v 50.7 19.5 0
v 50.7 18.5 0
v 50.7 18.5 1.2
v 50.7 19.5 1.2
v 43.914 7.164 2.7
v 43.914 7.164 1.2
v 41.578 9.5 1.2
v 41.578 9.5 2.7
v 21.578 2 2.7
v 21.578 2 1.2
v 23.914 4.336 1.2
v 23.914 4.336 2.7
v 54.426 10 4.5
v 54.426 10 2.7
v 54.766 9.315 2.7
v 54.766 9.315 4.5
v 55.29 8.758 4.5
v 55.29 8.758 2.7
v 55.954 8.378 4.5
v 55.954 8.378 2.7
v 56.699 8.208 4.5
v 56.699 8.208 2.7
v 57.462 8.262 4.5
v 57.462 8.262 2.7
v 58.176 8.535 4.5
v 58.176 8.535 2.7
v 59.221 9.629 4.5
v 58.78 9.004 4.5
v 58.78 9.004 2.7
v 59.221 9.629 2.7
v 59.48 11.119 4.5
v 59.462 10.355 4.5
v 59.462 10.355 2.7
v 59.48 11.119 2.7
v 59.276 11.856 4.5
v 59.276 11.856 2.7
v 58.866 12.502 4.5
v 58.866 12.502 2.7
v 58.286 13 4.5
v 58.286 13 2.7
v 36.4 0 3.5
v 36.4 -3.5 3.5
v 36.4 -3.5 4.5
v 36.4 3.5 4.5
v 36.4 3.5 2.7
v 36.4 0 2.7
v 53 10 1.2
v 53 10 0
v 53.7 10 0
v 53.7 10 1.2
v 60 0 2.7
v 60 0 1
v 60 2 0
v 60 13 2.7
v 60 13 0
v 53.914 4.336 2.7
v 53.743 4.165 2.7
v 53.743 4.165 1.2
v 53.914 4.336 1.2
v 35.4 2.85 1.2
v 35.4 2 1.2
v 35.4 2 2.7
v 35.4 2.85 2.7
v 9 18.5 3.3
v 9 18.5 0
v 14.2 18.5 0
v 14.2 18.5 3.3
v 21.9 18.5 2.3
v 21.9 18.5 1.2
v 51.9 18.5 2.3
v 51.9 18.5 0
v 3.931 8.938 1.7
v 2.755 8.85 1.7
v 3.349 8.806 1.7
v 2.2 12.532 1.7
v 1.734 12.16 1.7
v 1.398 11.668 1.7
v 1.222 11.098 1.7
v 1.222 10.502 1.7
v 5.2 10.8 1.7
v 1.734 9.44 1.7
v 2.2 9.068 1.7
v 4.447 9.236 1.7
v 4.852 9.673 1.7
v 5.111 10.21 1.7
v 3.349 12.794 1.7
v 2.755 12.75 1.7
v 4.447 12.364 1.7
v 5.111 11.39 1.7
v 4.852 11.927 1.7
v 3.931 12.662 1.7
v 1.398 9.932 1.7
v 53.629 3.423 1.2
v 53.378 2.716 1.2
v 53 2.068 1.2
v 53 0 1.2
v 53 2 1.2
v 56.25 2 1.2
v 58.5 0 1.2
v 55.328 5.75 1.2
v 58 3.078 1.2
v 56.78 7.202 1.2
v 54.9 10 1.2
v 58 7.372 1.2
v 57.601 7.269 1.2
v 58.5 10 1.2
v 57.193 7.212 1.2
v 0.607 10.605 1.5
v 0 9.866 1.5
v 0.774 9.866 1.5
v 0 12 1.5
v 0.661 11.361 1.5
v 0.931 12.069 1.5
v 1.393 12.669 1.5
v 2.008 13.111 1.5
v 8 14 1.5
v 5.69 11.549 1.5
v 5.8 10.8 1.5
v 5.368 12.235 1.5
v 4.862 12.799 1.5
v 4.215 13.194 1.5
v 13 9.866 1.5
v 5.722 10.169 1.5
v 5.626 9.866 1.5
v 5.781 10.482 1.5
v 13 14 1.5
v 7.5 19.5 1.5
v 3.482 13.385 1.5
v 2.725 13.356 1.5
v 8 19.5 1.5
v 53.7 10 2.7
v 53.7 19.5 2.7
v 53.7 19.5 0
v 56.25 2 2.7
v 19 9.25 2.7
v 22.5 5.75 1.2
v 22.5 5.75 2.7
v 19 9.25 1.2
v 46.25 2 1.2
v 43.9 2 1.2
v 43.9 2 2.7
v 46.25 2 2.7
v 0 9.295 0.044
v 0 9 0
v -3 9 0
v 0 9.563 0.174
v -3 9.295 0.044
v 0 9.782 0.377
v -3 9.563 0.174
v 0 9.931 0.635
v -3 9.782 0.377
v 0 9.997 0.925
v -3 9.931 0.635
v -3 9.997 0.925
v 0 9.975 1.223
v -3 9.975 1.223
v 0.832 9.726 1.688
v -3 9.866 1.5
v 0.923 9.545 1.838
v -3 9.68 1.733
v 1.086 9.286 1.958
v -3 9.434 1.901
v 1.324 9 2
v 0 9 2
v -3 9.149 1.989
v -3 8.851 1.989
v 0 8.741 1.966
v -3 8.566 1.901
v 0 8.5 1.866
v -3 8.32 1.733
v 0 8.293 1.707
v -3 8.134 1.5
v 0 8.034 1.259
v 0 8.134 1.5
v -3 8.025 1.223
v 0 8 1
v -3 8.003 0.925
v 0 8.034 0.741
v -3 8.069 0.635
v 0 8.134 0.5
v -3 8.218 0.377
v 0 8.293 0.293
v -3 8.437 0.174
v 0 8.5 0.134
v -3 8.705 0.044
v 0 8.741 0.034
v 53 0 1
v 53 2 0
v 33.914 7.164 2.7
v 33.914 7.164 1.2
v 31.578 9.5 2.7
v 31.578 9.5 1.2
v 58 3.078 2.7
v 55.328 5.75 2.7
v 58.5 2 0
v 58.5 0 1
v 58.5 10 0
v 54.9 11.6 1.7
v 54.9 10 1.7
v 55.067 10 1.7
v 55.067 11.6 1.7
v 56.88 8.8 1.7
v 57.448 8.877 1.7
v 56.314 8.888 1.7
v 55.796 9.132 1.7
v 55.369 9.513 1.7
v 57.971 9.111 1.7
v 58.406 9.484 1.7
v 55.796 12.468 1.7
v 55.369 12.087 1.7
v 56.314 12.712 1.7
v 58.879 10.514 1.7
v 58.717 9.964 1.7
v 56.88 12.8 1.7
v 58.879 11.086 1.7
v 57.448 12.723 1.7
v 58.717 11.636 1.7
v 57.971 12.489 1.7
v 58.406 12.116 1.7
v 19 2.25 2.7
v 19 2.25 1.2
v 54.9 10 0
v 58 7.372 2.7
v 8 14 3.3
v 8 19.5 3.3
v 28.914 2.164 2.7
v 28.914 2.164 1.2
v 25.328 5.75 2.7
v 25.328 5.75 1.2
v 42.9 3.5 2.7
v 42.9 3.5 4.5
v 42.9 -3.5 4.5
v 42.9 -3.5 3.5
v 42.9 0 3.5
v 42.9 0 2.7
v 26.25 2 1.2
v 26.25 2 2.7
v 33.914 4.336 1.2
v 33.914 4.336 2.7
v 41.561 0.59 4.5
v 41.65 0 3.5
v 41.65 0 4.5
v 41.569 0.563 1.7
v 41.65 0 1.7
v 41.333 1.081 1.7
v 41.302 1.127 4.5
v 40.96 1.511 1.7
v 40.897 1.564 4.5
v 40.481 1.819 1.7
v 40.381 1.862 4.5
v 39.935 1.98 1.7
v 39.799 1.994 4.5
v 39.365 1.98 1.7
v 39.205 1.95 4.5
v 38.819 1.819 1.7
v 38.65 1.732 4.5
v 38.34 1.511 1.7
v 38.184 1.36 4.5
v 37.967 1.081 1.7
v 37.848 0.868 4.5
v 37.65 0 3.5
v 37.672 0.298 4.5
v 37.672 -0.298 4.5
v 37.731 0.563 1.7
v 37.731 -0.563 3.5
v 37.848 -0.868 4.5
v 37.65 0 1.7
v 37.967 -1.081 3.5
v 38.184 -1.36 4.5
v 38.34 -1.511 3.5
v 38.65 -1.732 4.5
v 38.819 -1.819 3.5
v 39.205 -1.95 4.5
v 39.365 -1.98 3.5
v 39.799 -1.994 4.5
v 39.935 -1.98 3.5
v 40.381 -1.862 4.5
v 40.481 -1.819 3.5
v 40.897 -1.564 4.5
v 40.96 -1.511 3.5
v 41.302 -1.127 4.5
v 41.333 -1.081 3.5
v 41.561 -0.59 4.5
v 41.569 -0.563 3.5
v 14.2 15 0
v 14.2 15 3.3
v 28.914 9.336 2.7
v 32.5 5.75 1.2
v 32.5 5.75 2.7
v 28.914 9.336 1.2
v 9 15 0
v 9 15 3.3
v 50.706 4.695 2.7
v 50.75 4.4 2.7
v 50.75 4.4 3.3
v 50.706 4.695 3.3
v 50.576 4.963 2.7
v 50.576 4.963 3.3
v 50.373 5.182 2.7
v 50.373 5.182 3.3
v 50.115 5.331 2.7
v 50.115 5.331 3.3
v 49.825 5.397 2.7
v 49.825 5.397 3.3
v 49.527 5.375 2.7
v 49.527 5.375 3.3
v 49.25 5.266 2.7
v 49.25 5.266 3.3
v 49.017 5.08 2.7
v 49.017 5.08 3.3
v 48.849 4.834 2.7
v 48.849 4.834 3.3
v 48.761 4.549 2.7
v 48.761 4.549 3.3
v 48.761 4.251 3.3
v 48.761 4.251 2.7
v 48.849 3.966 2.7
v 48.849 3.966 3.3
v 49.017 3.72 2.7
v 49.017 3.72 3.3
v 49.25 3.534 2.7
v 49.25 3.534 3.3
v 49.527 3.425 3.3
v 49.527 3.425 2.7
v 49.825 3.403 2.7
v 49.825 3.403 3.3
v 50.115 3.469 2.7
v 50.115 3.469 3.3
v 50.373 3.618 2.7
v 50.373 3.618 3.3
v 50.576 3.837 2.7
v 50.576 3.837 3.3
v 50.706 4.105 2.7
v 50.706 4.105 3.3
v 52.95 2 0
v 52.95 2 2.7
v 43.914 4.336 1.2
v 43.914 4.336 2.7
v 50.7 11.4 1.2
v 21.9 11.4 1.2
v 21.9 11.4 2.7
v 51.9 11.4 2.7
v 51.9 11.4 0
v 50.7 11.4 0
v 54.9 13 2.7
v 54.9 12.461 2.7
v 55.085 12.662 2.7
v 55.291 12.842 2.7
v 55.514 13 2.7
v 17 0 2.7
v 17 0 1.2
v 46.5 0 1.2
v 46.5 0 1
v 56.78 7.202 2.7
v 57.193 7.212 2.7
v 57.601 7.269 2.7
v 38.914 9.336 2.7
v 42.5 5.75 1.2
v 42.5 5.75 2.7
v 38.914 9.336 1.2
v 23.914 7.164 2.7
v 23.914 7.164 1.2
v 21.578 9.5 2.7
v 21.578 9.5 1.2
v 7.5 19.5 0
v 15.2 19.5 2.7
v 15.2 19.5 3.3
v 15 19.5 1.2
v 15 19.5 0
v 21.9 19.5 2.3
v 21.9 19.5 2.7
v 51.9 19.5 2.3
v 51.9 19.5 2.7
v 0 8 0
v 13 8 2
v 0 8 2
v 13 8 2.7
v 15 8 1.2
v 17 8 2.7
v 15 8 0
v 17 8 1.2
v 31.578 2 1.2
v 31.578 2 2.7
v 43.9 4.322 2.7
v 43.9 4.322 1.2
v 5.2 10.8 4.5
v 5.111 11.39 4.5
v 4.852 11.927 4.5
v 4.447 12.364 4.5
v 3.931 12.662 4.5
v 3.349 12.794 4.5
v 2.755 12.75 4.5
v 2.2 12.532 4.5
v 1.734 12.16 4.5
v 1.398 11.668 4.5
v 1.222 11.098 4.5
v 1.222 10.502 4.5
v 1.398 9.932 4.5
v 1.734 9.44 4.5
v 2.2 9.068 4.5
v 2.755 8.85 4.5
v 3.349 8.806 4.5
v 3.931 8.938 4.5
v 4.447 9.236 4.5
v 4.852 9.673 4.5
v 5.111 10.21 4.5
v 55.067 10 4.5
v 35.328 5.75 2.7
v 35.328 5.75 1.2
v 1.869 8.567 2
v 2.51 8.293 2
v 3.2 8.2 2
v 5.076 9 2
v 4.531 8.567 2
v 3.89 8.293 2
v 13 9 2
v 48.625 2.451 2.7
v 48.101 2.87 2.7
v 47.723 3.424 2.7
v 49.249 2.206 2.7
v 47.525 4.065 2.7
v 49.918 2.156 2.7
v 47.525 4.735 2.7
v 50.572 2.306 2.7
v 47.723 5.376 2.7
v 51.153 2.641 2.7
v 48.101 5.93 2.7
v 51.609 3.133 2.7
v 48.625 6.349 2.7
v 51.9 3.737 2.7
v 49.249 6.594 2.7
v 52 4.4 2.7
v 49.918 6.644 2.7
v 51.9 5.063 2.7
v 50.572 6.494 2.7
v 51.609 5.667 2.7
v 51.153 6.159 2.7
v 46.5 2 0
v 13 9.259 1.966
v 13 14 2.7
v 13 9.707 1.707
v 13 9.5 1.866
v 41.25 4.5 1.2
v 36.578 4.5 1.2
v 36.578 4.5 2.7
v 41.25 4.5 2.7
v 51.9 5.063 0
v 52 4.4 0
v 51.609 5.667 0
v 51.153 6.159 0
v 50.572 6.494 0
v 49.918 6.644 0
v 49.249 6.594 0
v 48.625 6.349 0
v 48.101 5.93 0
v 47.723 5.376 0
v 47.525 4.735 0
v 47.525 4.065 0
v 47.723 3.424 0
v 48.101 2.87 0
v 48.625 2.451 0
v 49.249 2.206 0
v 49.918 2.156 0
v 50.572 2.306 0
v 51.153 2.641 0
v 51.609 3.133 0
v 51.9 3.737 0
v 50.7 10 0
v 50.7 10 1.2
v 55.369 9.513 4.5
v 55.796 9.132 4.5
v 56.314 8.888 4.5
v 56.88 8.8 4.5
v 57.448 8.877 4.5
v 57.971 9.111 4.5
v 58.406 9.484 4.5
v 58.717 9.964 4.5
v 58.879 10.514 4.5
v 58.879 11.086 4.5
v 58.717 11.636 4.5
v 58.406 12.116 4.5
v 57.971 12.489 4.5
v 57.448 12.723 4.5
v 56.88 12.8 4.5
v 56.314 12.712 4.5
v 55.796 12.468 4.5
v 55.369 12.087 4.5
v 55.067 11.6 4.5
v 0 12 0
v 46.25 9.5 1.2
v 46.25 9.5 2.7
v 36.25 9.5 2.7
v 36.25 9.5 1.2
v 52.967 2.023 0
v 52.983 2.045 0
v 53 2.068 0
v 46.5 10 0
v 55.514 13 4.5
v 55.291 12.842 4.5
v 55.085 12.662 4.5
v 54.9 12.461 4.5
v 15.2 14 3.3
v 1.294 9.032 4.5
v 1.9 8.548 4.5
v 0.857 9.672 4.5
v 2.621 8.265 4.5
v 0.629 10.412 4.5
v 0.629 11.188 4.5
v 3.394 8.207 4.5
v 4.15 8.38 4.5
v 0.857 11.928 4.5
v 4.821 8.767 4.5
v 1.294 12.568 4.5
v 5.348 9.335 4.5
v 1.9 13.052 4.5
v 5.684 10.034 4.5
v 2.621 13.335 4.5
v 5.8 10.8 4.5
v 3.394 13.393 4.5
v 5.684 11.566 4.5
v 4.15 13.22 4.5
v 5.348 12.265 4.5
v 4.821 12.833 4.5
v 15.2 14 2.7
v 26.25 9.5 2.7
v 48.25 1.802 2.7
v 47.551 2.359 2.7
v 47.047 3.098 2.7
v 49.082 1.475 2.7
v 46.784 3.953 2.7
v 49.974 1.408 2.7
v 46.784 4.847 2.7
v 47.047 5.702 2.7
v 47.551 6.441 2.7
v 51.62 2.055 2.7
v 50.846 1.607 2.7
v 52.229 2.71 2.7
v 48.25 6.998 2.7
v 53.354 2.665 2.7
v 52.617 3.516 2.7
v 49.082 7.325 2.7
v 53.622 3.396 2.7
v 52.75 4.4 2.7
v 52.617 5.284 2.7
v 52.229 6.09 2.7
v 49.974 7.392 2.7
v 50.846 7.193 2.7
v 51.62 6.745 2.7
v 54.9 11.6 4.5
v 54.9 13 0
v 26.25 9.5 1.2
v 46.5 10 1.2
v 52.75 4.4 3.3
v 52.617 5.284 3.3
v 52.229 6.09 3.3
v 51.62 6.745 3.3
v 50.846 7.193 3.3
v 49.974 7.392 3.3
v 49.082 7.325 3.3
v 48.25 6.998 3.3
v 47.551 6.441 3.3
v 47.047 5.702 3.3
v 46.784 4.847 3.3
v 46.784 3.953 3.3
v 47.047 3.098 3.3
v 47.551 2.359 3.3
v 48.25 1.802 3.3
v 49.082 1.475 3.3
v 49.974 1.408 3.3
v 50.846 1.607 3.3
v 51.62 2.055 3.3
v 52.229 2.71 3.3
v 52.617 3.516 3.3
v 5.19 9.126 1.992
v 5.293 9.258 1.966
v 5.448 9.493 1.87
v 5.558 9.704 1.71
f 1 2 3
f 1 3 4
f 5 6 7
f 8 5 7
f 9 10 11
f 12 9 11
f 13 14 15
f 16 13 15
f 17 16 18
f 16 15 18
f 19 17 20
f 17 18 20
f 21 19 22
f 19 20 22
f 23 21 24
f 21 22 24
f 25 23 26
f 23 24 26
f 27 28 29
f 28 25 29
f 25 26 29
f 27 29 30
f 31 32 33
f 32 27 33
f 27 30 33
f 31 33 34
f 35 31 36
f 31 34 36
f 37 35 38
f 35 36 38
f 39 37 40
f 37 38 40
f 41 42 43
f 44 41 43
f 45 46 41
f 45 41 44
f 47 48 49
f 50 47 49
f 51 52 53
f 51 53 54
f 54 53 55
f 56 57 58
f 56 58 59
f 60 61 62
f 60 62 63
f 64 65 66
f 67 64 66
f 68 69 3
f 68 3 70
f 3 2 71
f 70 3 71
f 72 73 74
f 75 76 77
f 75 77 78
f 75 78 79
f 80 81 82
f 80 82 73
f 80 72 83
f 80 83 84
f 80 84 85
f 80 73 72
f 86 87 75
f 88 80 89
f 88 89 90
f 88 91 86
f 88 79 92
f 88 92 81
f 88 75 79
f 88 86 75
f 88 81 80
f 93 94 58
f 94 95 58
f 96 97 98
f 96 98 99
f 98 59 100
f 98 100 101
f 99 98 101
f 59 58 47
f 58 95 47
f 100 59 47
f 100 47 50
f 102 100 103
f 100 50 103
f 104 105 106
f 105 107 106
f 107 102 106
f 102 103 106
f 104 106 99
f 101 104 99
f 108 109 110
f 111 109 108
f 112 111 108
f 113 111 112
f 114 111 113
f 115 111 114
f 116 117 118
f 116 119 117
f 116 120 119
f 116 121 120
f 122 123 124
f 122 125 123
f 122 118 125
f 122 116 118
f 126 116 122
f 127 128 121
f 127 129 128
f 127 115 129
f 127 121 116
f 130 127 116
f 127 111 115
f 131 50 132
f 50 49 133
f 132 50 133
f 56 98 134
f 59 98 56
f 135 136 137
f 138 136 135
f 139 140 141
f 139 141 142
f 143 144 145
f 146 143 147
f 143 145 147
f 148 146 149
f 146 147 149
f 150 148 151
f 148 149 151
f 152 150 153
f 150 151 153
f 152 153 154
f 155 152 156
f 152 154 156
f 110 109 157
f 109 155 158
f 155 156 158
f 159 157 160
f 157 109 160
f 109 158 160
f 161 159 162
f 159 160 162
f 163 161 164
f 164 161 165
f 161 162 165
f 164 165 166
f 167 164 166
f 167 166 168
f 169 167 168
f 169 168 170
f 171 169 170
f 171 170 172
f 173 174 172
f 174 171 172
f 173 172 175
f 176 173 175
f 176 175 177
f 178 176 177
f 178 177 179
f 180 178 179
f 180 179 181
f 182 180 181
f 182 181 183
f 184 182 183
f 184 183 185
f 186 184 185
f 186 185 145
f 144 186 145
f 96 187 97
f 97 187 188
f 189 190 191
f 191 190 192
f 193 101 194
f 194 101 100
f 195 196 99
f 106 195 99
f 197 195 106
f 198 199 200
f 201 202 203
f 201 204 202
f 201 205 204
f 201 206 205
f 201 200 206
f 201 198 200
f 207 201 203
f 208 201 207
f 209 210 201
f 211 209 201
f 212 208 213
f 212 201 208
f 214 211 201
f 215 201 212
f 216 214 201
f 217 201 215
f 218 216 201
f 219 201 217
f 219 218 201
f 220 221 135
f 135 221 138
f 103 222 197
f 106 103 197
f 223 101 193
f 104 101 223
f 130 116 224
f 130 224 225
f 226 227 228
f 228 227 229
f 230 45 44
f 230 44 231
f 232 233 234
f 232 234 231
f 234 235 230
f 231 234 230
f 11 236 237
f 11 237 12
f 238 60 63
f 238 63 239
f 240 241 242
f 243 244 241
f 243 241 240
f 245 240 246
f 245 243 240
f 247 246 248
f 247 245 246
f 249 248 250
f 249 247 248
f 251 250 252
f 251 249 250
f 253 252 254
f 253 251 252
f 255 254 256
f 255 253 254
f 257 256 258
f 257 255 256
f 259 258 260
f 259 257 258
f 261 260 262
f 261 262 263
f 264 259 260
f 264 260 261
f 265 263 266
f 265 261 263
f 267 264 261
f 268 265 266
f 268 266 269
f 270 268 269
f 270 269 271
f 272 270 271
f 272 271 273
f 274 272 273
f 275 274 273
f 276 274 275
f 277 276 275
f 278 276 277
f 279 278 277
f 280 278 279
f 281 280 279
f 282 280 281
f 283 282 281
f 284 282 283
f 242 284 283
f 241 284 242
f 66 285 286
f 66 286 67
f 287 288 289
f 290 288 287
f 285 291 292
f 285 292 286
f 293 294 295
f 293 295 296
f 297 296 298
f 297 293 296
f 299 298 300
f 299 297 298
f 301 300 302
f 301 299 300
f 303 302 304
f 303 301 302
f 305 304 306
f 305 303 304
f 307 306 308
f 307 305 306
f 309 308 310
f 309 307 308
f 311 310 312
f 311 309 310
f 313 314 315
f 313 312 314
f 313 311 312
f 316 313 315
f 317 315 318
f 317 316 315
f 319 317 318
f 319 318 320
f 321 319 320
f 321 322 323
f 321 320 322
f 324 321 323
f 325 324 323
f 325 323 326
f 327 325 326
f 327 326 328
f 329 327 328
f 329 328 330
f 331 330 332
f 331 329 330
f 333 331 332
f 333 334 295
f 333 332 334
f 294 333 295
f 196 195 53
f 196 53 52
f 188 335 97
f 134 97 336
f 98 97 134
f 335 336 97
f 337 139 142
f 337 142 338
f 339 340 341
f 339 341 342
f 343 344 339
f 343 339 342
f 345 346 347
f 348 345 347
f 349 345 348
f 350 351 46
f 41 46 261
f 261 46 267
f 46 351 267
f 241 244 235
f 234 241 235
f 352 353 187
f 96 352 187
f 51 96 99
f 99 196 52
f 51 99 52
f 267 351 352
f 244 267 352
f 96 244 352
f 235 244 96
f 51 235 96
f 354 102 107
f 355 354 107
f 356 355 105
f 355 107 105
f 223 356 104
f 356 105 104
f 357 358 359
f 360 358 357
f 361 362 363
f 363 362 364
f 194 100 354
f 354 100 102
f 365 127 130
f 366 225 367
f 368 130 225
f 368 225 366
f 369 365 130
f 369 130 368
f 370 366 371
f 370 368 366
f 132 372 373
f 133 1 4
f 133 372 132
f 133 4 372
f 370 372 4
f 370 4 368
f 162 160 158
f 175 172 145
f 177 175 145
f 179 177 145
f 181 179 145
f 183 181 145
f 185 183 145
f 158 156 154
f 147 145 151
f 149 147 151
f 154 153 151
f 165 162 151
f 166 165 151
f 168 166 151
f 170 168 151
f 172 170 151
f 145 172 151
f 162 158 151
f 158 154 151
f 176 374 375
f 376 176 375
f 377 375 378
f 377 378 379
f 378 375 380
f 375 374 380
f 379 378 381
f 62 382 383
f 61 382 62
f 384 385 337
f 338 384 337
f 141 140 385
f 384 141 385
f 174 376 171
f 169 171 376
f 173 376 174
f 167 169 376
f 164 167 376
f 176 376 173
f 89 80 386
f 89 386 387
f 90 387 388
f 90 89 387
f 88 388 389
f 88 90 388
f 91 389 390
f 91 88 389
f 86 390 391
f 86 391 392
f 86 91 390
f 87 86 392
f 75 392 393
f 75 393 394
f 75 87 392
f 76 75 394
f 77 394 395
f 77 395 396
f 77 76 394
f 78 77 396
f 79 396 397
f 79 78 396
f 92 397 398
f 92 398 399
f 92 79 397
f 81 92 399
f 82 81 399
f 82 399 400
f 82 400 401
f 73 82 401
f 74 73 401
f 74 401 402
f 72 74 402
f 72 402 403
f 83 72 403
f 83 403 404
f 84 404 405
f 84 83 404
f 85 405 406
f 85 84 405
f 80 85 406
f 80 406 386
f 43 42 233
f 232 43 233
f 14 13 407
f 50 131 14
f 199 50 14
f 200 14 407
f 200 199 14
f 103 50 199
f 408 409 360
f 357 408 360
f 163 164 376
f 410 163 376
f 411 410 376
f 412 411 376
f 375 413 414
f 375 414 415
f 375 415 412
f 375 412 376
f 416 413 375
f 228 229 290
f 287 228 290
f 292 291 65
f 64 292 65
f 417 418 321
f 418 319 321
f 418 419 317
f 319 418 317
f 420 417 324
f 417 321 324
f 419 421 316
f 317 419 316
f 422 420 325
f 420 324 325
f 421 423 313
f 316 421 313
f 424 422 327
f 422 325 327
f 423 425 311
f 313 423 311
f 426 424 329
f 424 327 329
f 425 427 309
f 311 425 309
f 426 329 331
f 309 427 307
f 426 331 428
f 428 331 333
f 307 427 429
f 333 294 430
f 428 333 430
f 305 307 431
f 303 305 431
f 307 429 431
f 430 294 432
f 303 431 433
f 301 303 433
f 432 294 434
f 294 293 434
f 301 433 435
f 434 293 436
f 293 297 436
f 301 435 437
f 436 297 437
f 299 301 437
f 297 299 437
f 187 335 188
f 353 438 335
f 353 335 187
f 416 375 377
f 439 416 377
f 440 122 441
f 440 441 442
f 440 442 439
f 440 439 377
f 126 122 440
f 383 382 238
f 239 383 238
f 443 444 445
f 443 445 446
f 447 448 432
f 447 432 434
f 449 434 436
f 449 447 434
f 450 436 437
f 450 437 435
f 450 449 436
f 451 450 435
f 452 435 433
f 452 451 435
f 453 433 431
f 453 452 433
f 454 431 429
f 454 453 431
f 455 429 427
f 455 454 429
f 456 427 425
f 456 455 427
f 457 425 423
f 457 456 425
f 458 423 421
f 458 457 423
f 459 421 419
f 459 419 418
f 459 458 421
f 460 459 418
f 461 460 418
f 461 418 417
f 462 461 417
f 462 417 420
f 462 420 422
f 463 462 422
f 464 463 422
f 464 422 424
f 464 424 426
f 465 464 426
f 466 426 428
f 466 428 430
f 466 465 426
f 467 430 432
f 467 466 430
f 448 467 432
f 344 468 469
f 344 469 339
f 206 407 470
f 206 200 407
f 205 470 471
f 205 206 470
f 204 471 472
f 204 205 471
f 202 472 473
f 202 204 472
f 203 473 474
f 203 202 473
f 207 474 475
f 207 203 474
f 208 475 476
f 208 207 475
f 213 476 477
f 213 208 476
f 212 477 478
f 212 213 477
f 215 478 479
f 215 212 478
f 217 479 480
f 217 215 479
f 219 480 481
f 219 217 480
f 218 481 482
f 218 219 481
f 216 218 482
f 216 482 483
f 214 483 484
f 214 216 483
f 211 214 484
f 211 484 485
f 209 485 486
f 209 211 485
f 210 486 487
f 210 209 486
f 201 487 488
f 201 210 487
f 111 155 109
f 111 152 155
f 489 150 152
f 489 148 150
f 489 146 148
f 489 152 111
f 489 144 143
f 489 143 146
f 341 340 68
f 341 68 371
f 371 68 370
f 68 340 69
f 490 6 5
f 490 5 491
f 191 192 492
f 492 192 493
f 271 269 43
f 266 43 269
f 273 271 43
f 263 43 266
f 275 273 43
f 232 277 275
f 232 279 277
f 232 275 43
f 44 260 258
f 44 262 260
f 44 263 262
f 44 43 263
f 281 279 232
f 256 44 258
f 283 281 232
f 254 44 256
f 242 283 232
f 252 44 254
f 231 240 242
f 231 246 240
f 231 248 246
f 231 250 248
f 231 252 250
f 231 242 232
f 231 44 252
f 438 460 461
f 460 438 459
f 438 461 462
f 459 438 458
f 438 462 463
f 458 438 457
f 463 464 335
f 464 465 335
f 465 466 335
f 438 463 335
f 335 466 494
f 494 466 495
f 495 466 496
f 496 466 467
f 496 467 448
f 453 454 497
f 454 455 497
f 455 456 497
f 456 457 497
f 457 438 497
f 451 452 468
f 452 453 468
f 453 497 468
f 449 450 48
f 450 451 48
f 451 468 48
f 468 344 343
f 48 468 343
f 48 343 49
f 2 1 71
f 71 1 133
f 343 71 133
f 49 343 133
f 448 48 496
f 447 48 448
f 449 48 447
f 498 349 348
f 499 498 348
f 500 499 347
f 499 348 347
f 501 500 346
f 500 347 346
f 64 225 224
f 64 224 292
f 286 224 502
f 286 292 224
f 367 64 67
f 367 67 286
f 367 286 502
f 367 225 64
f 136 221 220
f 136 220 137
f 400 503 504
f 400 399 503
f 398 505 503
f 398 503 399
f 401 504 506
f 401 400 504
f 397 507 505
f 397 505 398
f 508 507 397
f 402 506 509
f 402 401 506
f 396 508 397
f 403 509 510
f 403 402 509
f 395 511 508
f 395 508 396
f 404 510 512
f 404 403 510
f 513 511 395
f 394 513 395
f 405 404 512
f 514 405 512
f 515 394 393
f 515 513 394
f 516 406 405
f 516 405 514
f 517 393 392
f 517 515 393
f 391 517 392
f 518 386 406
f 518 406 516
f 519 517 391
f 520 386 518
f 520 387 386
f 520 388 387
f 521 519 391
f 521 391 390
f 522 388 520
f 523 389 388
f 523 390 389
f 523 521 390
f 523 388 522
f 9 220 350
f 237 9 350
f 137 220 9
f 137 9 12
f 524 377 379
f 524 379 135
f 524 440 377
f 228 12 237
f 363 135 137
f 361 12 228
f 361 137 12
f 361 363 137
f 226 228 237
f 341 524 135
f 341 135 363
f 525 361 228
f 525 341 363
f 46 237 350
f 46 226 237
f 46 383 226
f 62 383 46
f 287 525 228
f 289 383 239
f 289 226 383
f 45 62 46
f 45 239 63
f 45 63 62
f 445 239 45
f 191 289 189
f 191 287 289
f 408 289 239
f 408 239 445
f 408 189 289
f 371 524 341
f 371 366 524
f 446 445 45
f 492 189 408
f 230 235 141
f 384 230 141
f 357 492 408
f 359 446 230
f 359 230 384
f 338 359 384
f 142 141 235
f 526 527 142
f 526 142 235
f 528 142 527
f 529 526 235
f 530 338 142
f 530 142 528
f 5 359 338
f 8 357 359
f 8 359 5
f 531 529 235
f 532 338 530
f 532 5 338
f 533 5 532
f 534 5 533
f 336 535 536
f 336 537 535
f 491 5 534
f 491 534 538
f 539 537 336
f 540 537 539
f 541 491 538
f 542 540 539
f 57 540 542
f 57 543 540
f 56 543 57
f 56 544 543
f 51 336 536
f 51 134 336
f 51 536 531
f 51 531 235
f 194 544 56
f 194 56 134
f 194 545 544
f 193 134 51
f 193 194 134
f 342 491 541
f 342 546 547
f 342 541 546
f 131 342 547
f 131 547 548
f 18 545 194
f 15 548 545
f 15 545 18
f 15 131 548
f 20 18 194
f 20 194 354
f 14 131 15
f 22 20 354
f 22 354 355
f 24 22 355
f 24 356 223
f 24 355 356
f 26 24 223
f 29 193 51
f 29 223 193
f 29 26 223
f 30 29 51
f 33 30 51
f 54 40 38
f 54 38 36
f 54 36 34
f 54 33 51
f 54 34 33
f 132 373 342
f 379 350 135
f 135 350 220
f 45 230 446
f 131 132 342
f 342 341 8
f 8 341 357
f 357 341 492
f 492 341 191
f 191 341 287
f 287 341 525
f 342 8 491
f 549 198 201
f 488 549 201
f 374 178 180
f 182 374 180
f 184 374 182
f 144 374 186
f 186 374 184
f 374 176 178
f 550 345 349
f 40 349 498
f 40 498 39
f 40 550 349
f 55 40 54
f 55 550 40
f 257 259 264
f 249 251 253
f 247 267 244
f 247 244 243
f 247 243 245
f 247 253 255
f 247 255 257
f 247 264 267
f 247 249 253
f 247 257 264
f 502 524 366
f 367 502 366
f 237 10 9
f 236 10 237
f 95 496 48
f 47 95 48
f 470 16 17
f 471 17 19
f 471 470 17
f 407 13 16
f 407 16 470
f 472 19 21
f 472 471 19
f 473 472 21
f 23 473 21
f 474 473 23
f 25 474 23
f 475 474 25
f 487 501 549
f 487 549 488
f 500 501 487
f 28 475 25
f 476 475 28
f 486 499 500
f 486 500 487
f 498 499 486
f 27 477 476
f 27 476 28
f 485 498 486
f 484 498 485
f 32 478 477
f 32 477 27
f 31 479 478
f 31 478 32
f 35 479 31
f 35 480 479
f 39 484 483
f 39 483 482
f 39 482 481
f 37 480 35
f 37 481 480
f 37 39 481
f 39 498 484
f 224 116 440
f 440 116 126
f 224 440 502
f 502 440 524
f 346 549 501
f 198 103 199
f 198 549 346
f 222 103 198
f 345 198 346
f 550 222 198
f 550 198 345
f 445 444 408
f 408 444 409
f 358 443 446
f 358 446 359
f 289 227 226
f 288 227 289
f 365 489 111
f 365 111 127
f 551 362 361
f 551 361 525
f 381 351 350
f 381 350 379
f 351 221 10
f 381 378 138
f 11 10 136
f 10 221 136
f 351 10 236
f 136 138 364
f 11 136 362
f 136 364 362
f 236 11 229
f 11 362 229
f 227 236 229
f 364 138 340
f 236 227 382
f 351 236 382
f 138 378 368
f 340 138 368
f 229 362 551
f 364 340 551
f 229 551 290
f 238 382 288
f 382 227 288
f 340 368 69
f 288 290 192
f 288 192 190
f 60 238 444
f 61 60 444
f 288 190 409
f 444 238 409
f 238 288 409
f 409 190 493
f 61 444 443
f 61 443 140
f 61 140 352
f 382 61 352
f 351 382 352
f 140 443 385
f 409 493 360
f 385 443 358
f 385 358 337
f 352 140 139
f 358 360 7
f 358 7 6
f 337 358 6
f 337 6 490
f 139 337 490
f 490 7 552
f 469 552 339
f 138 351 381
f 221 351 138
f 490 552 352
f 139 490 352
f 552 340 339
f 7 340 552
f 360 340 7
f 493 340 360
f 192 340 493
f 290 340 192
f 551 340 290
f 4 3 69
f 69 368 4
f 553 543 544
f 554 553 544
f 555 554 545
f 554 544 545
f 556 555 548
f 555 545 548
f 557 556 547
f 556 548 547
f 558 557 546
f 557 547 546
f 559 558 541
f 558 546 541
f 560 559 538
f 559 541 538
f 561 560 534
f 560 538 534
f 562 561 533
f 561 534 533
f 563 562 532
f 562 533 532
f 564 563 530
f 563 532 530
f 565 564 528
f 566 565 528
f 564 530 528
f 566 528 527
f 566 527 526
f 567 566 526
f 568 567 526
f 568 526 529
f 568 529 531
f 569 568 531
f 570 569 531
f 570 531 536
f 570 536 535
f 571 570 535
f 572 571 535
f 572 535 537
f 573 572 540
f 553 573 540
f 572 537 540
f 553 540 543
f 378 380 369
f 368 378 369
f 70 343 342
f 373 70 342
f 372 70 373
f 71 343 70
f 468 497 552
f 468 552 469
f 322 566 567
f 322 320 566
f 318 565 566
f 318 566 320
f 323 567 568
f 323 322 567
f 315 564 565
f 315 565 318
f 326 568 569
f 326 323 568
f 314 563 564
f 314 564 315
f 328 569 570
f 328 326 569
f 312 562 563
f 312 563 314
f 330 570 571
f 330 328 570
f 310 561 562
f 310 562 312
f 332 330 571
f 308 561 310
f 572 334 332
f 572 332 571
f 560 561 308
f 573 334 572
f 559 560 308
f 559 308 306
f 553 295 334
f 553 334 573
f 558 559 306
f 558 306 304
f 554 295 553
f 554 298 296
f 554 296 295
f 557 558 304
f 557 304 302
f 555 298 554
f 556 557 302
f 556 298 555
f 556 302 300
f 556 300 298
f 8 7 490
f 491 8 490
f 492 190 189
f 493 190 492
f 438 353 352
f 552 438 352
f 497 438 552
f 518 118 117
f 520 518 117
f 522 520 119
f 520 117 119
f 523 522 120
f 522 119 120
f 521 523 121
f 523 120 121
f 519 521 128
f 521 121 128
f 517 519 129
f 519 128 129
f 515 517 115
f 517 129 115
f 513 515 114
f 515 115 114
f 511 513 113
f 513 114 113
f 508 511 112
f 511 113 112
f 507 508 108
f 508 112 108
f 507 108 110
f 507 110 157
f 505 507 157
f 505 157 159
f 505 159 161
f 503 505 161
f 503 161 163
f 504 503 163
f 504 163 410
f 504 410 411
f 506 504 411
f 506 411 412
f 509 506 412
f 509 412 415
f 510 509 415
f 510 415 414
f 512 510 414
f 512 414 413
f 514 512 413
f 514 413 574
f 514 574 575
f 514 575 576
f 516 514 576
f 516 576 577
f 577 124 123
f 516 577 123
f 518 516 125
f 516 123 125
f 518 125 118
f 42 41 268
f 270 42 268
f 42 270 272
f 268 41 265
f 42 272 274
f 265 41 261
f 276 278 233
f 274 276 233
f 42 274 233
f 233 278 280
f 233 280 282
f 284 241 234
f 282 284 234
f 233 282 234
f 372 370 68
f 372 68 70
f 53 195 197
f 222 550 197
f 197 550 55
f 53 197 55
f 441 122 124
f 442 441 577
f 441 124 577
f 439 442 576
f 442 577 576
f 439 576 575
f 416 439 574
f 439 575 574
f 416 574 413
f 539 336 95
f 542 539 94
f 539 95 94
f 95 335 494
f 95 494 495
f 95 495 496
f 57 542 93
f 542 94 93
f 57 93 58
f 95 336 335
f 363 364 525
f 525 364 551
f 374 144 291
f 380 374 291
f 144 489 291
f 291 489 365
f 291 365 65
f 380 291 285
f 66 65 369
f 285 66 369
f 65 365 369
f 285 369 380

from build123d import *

# Parameters (mm, degrees)
BOX021_W                = 2
BOX021_H                = 15
BOX021_DEPTH            = 10
BOX021_PLACEMENT_ANGLE  = -45
BOX019_W                = 2
BOX019_H                = 15
BOX019_DEPTH            = 10
BOX019_PLACEMENT_ANGLE  = -45
BOX017_W                = 2
BOX017_H                = 15
BOX017_DEPTH            = 10
BOX017_PLACEMENT_ANGLE  = 45
BOX018_W                = 2
BOX018_H                = 15
BOX018_DEPTH            = 10
BOX018_PLACEMENT_ANGLE  = 45
BOX020_W                = 2
BOX020_H                = 15
BOX020_DEPTH            = 10
BOX020_PLACEMENT_ANGLE  = -45
BOX024_W                = 2
BOX024_H                = 15
BOX024_DEPTH            = 10
BOX024_PLACEMENT_ANGLE  = -45
BOX025_W                = 2
BOX025_H                = 15
BOX025_DEPTH            = 10
BOX025_PLACEMENT_ANGLE  = 45
BOX026_W                = 12
BOX026_H                = 7
BOX026_DEPTH            = 10
BOX026_PLACEMENT_ANGLE  = 45
BOX016_W                = 2
BOX016_H                = 15
BOX016_DEPTH            = 10
BOX016_PLACEMENT_ANGLE  = 45
CYLINDER009_R           = 3.6
CYLINDER009_DEPTH       = 10
CYLINDER010_R           = 4
CYLINDER010_DEPTH       = 10
BOX022_W                = 8.5
BOX022_H                = 8
BOX022_DEPTH            = 10
BOX023_W                = 39
BOX023_H                = 7.5
BOX023_DEPTH            = 10
BOX027_W                = 15
BOX027_H                = 10
BOX027_DEPTH            = 10
BOX027_PLACEMENT_ANGLE  = 45
CYLINDER004_R           = 2
CYLINDER004_DEPTH       = 2.8
BOX007_W                = 1.2
BOX007_H                = 10
BOX007_DEPTH            = 5
CYLINDER001_R           = 1
CYLINDER001_DEPTH       = 10
CYLINDER_R              = 2.25
CYLINDER_DEPTH          = 2.7
BOX009_W                = 5.2
BOX009_H                = 3.5
BOX009_DEPTH            = 3.3
BOX010_W                = 30
BOX010_H                = 7.1
BOX010_DEPTH            = 3
BOX011_W                = 30
BOX011_H                = 1
BOX011_DEPTH            = 2
BOX013_W                = 60
BOX013_H                = 10
BOX013_DEPTH            = 3.5
CYLINDER007_R           = 2
CYLINDER007_DEPTH       = 2.8
BOX014_W                = 7.2
BOX014_H                = 6.5
BOX014_DEPTH            = 5
BOX028_W                = 3
BOX028_H                = 1.6
BOX028_DEPTH            = 3
CYLINDER005_R           = 2
CYLINDER005_DEPTH       = 2.8
CYLINDER002_R           = 2.6
CYLINDER002_DEPTH       = 3
CYLINDER003_R           = 2.6
CYLINDER003_DEPTH       = 3
BOX008_W                = 7.2
BOX008_H                = 5.5
BOX008_DEPTH            = 2.1
CYLINDER006_R           = 3
CYLINDER006_DEPTH       = 0.6
BOX012_W                = 6.5
BOX012_H                = 7
BOX012_DEPTH            = 2.5
CYLINDER008_R           = 1
CYLINDER008_DEPTH       = 16
CYLINDER008_PITCH_ANGLE = 90
BOX015_W                = 13
BOX015_H                = 1
BOX015_DEPTH            = 2
BOX004_W                = 17
BOX004_H                = 8
BOX004_DEPTH            = 4
BOX001_W                = 31.5
BOX001_H                = 20
BOX001_DEPTH            = 1.2
BOX003_W                = 4.7
BOX003_H                = 10
BOX003_DEPTH            = 1.2
BOX002_W                = 5.5
BOX002_H                = 10
BOX002_DEPTH            = 1.2
BOX005_W                = 1.2
BOX005_H                = 10
BOX005_DEPTH            = 4
BOX006_W                = 13
BOX006_H                = 12
BOX006_DEPTH            = 3
PAD_DEPTH               = 100
BOX_W                   = 60
BOX_H                   = 19.5
BOX_DEPTH               = 2.7


with BuildPart() as cube021:
    # Box021 → Box021 (new body)
    with BuildSketch(Plane.XY):
        with Locations((1, 7.5)):
            Rectangle(BOX021_W, BOX021_H)
    extrude(amount=BOX021_DEPTH)


with BuildPart() as cube021_1:
    # Box021 placement: moved
    add(cube021.part.moved(Location((18, 1, 0))).rotate(Axis((18, 1, 0), (0, 0, 1)), BOX021_PLACEMENT_ANGLE))


with BuildPart() as cube019:
    # Box019 → Box019 (new body)
    with BuildSketch(Plane.XY):
        with Locations((1, 7.5)):
            Rectangle(BOX019_W, BOX019_H)
    extrude(amount=BOX019_DEPTH)


with BuildPart() as cube019_1:
    # Box019 placement: moved
    add(cube019.part.moved(Location((38, 1, 0))).rotate(Axis((38, 1, 0), (0, 0, 1)), BOX019_PLACEMENT_ANGLE))


with BuildPart() as cube017:
    # Box017 → Box017 (new body)
    with BuildSketch(Plane.XY):
        with Locations((1, 7.5)):
            Rectangle(BOX017_W, BOX017_H)
    extrude(amount=BOX017_DEPTH)


with BuildPart() as cube017_1:
    # Box017 placement: moved
    add(cube017.part.moved(Location((28, 0, 0))).rotate(Axis((28, 0, 0), (0, 0, 1)), BOX017_PLACEMENT_ANGLE))


with BuildPart() as cube018:
    # Box018 → Box018 (new body)
    with BuildSketch(Plane.XY):
        with Locations((1, 7.5)):
            Rectangle(BOX018_W, BOX018_H)
    extrude(amount=BOX018_DEPTH)


with BuildPart() as cube018_1:
    # Box018 placement: moved
    add(cube018.part.moved(Location((48, 0, 0))).rotate(Axis((48, 0, 0), (0, 0, 1)), BOX018_PLACEMENT_ANGLE))


with BuildPart() as cube020:
    # Box020 → Box020 (new body)
    with BuildSketch(Plane.XY):
        with Locations((1, 7.5)):
            Rectangle(BOX020_W, BOX020_H)
    extrude(amount=BOX020_DEPTH)


with BuildPart() as cube020_1:
    # Box020 placement: moved
    add(cube020.part.moved(Location((28, 1, 0))).rotate(Axis((28, 1, 0), (0, 0, 1)), BOX020_PLACEMENT_ANGLE))


with BuildPart() as cube024:
    # Box024 → Box024 (new body)
    with BuildSketch(Plane.XY):
        with Locations((1, 7.5)):
            Rectangle(BOX024_W, BOX024_H)
    extrude(amount=BOX024_DEPTH)


with BuildPart() as cube024_1:
    # Box024 placement: moved
    add(cube024.part.moved(Location((48, 1, 0))).rotate(Axis((48, 1, 0), (0, 0, 1)), BOX024_PLACEMENT_ANGLE))


with BuildPart() as cube025:
    # Box025 → Box025 (new body)
    with BuildSketch(Plane.XY):
        with Locations((1, 7.5)):
            Rectangle(BOX025_W, BOX025_H)
    extrude(amount=BOX025_DEPTH)


with BuildPart() as cube025_1:
    # Box025 placement: moved
    add(cube025.part.moved(Location((58, 0, 0))).rotate(Axis((58, 0, 0), (0, 0, 1)), BOX025_PLACEMENT_ANGLE))


with BuildPart() as cube026:
    # Box026 → Box026 (new body)
    with BuildSketch(Plane.XY):
        with Locations((6, 3.5)):
            Rectangle(BOX026_W, BOX026_H)
    extrude(amount=BOX026_DEPTH)


with BuildPart() as cube026_1:
    # Box026 placement: moved
    add(cube026.part.moved(Location((49, 1, 0))).rotate(Axis((49, 1, 0), (0, 0, 1)), BOX026_PLACEMENT_ANGLE))


with BuildPart() as fusion003:
    # Box016 → Box016 (new body)
    with BuildSketch(Plane.XY):
        with Locations((1, 7.5)):
            Rectangle(BOX016_W, BOX016_H)
    extrude(amount=BOX016_DEPTH)


with BuildPart() as fusion003_1:
    # Box016 placement: moved
    add(fusion003.part.moved(Location((38, 0, 0))).rotate(Axis((38, 0, 0), (0, 0, 1)), BOX016_PLACEMENT_ANGLE))

    # Fusion003: union Cube021, Cube019, Cube017, Cube018, Cube020, Cube024, Cube025, Cube026
    add(cube021_1.part)
    add(cube019_1.part)
    add(cube017_1.part)
    add(cube018_1.part)
    add(cube020_1.part)
    add(cube024_1.part)
    add(cube025_1.part)
    add(cube026_1.part)


with BuildPart() as fusion003_2:
    # Fusion003 placement: moved
    add(fusion003_1.part.moved(Location((0, 0.25, 0))))


with BuildPart() as cylinder009:
    # Cylinder009 → Cylinder009 (new body)
    with BuildSketch(Plane(origin=(56.9, 10.8, 0), x_dir=(1, 0, 0), z_dir=(0, 0, 1))):
        Circle(CYLINDER009_R)
    extrude(amount=CYLINDER009_DEPTH)


with BuildPart() as cylinder010:
    # Cylinder010 → Cylinder010 (new body)
    with BuildSketch(Plane(origin=(49.75, 4.4, 0), x_dir=(1, 0, 0), z_dir=(0, 0, 1))):
        Circle(CYLINDER010_R)
    extrude(amount=CYLINDER010_DEPTH)


with BuildPart() as fusion004:
    # Box022 → Box022 (new body)
    with BuildSketch(Plane(origin=(35.4, -3.5, 0), x_dir=(1, 0, 0), z_dir=(0, 0, 1))):
        with Locations((4.25, 4)):
            Rectangle(BOX022_W, BOX022_H)
    extrude(amount=BOX022_DEPTH)

    # Fusion004: union Fusion003, Cylinder009, Cylinder010
    add(fusion003_2.part)
    add(cylinder009.part)
    add(cylinder010.part)


with BuildPart() as cut002:
    # Box023 → Box023 (new body)
    with BuildSketch(Plane(origin=(19, 2, 0), x_dir=(1, 0, 0), z_dir=(0, 0, 1))):
        with Locations((19.5, 3.75)):
            Rectangle(BOX023_W, BOX023_H)
    extrude(amount=BOX023_DEPTH)

    # Cut002: cut Fusion004
    add(fusion004.part, mode=Mode.SUBTRACT)


with BuildPart() as fusion005:
    # Box027 → Box027 (new body)
    with BuildSketch(Plane.XY):
        with Locations((7.5, 5)):
            Rectangle(BOX027_W, BOX027_H)
    extrude(amount=BOX027_DEPTH)


with BuildPart() as fusion005_1:
    # Box027 placement: moved
    add(fusion005.part.moved(Location((0, 12, 0))).rotate(Axis((0, 12, 0), (0, 0, 1)), BOX027_PLACEMENT_ANGLE))

    # Fusion005: union Cut002
    add(cut002.part)


with BuildPart() as cylinder004:
    # Cylinder004 → Cylinder004 (new body)
    with BuildSketch(Plane(origin=(3.2, 10.8, 1.7), x_dir=(1, 0, 0), z_dir=(0, 0, 1))):
        Circle(CYLINDER004_R)
    extrude(amount=CYLINDER004_DEPTH)


with BuildPart() as cube007:
    # Box007 → Box007 (new body)
    with BuildSketch(Plane(origin=(53.7, 10, 0), x_dir=(1, 0, 0), z_dir=(0, 0, 1))):
        with Locations((0.6, 5)):
            Rectangle(BOX007_W, BOX007_H)
    extrude(amount=BOX007_DEPTH)


with BuildPart() as cylinder001:
    # Cylinder001 → Cylinder001 (new body)
    with BuildSketch(Plane(origin=(49.75, 4.4, 0), x_dir=(1, 0, 0), z_dir=(0, 0, 1))):
        Circle(CYLINDER001_R)
    extrude(amount=CYLINDER001_DEPTH)


with BuildPart() as cylinder:
    # Cylinder → Cylinder (new body)
    with BuildSketch(Plane(origin=(49.75, 4.4, 0), x_dir=(1, 0, 0), z_dir=(0, 0, 1))):
        Circle(CYLINDER_R)
    extrude(amount=CYLINDER_DEPTH)


with BuildPart() as cube009:
    # Box009 → Box009 (new body)
    with BuildSketch(Plane(origin=(9, 15, 0), x_dir=(1, 0, 0), z_dir=(0, 0, 1))):
        with Locations((2.6, 1.75)):
            Rectangle(BOX009_W, BOX009_H)
    extrude(amount=BOX009_DEPTH)


with BuildPart() as cube010:
    # Box010 → Box010 (new body)
    with BuildSketch(Plane(origin=(21.9, 11.4, 0), x_dir=(1, 0, 0), z_dir=(0, 0, 1))):
        with Locations((15, 3.55)):
            Rectangle(BOX010_W, BOX010_H)
    extrude(amount=BOX010_DEPTH)


with BuildPart() as cube011:
    # Box011 → Box011 (new body)
    with BuildSketch(Plane(origin=(21.9, 18.5, 2.3), x_dir=(1, 0, 0), z_dir=(0, 0, 1))):
        with Locations((15, 0.5)):
            Rectangle(BOX011_W, BOX011_H)
    extrude(amount=BOX011_DEPTH)


with BuildPart() as cube013:
    # Box013 → Box013 (new body)
    with BuildSketch(Plane(origin=(0, -10, 0), x_dir=(1, 0, 0), z_dir=(0, 0, 1))):
        with Locations((30, 5)):
            Rectangle(BOX013_W, BOX013_H)
    extrude(amount=BOX013_DEPTH)


with BuildPart() as cylinder007:
    # Cylinder007 → Cylinder007 (new body)
    with BuildSketch(Plane(origin=(39.65, 0, 1.7), x_dir=(1, 0, 0), z_dir=(0, 0, 1))):
        Circle(CYLINDER007_R)
    extrude(amount=CYLINDER007_DEPTH)


with BuildPart() as cube014:
    # Box014 → Box014 (new body)
    with BuildSketch(Plane(origin=(54, 13, 0), x_dir=(1, 0, 0), z_dir=(0, 0, 1))):
        with Locations((3.6, 3.25)):
            Rectangle(BOX014_W, BOX014_H)
    extrude(amount=BOX014_DEPTH)


with BuildPart() as cube028:
    # Box028 → Box028 (new body)
    with BuildSketch(Plane(origin=(53.9, 10, 1.7), x_dir=(1, 0, 0), z_dir=(0, 0, 1))):
        with Locations((1.5, 0.8)):
            Rectangle(BOX028_W, BOX028_H)
    extrude(amount=BOX028_DEPTH)


with BuildPart() as fusion002:
    # Cylinder005 → Cylinder005 (new body)
    with BuildSketch(Plane(origin=(56.9, 10.8, 1.7), x_dir=(1, 0, 0), z_dir=(0, 0, 1))):
        Circle(CYLINDER005_R)
    extrude(amount=CYLINDER005_DEPTH)

    # Fusion002: union Cylinder004, Cube007, Cylinder001, Cylinder, Cube009, Cube010, Cube011, Cube013, Cylinder007, Cube014, Cube028
    add(cylinder004.part)
    add(cube007.part)
    add(cylinder001.part)
    add(cylinder.part)
    add(cube009.part)
    add(cube010.part)
    add(cube011.part)
    add(cube013.part)
    add(cylinder007.part)
    add(cube014.part)
    add(cube028.part)


with BuildPart() as cylinder002:
    # Cylinder002 → Cylinder002 (new body)
    with BuildSketch(Plane(origin=(3.2, 10.8, 1.5), x_dir=(1, 0, 0), z_dir=(0, 0, 1))):
        Circle(CYLINDER002_R)
    extrude(amount=CYLINDER002_DEPTH)


with BuildPart() as cylinder003:
    # Cylinder003 → Cylinder003 (new body)
    with BuildSketch(Plane(origin=(56.9, 10.8, 1.5), x_dir=(1, 0, 0), z_dir=(0, 0, 1))):
        Circle(CYLINDER003_R)
    extrude(amount=CYLINDER003_DEPTH)


with BuildPart() as cube008:
    # Box008 → Box008 (new body)
    with BuildSketch(Plane(origin=(8, 14, 1.2), x_dir=(1, 0, 0), z_dir=(0, 0, 1))):
        with Locations((3.6, 2.75)):
            Rectangle(BOX008_W, BOX008_H)
    extrude(amount=BOX008_DEPTH)


with BuildPart() as cylinder006:
    # Cylinder006 → Cylinder006 (new body)
    with BuildSketch(Plane(origin=(49.75, 4.4, 2.7), x_dir=(1, 0, 0), z_dir=(0, 0, 1))):
        Circle(CYLINDER006_R)
    extrude(amount=CYLINDER006_DEPTH)


with BuildPart() as cube012:
    # Box012 → Box012 (new body)
    with BuildSketch(Plane(origin=(36.4, -3.5, 2), x_dir=(1, 0, 0), z_dir=(0, 0, 1))):
        with Locations((3.25, 3.5)):
            Rectangle(BOX012_W, BOX012_H)
    extrude(amount=BOX012_DEPTH)


with BuildPart() as cylinder008:
    # Cylinder008 → Cylinder008 (new body)
    with BuildSketch(Plane.XY):
        Circle(CYLINDER008_R)
    extrude(amount=CYLINDER008_DEPTH)


with BuildPart() as cylinder008_1:
    # Cylinder008 pitch: moved
    add(cylinder008.part.rotate(Axis((0, 0, 0), (0, 1, 0)), CYLINDER008_PITCH_ANGLE))


with BuildPart() as cylinder008_2:
    # Cylinder008 placement: moved
    add(cylinder008_1.part.moved(Location((-3, 9, 1))))


with BuildPart() as cube015:
    # Box015 → Box015 (new body)
    with BuildSketch(Plane(origin=(0, 8, 0), x_dir=(1, 0, 0), z_dir=(0, 0, 1))):
        with Locations((6.5, 0.5)):
            Rectangle(BOX015_W, BOX015_H)
    extrude(amount=BOX015_DEPTH)


with BuildPart() as cube004:
    # Box004 → Box004 (new body)
    with BuildSketch(Plane.XY):
        with Locations((8.5, 4)):
            Rectangle(BOX004_W, BOX004_H)
    extrude(amount=BOX004_DEPTH)


with BuildPart() as cube001:
    # Box001 → Box001 (new body)
    with BuildSketch(Plane(origin=(15, 0, 0), x_dir=(1, 0, 0), z_dir=(0, 0, 1))):
        with Locations((15.75, 10)):
            Rectangle(BOX001_W, BOX001_H)
    extrude(amount=BOX001_DEPTH)


with BuildPart() as cube003:
    # Box003 → Box003 (new body)
    with BuildSketch(Plane(origin=(46, 10, 0), x_dir=(1, 0, 0), z_dir=(0, 0, 1))):
        with Locations((2.35, 5)):
            Rectangle(BOX003_W, BOX003_H)
    extrude(amount=BOX003_DEPTH)


with BuildPart() as cube002:
    # Box002 → Box002 (new body)
    with BuildSketch(Plane(origin=(53, 0, 0), x_dir=(1, 0, 0), z_dir=(0, 0, 1))):
        with Locations((2.75, 5)):
            Rectangle(BOX002_W, BOX002_H)
    extrude(amount=BOX002_DEPTH)


with BuildPart() as cube005:
    # Box005 → Box005 (new body)
    with BuildSketch(Plane(origin=(53.7, 10, 0), x_dir=(1, 0, 0), z_dir=(0, 0, 1))):
        with Locations((0.6, 5)):
            Rectangle(BOX005_W, BOX005_H)
    extrude(amount=BOX005_DEPTH)


with BuildPart() as cube006:
    # Box006 → Box006 (new body)
    with BuildSketch(Plane(origin=(0, 8, 1.5), x_dir=(1, 0, 0), z_dir=(0, 0, 1))):
        with Locations((6.5, 6)):
            Rectangle(BOX006_W, BOX006_H)
    extrude(amount=BOX006_DEPTH)


with BuildPart() as fusion:
    # Sketch → Pad (new body)
    with BuildSketch(Plane.YZ):
        Polygon((0, 0), (2, 0), (0, 1), align=None)
    extrude(amount=PAD_DEPTH)

    # Fusion: union Cube004, Cube001, Cube003, Cube002, Cube005, Cube006
    add(cube004.part)
    add(cube001.part)
    add(cube003.part)
    add(cube002.part)
    add(cube005.part)
    add(cube006.part)


with BuildPart() as cut003:
    # Box → Box (new body)
    with BuildSketch(Plane.XY):
        with Locations((30, 9.75)):
            Rectangle(BOX_W, BOX_H)
    extrude(amount=BOX_DEPTH)

    # Cut: cut Fusion
    add(fusion.part, mode=Mode.SUBTRACT)

    # Fusion001: union Cylinder002, Cylinder003, Cube008, Cylinder006, Cube012, Cylinder008, Cube015
    add(cylinder002.part)
    add(cylinder003.part)
    add(cube008.part)
    add(cylinder006.part)
    add(cube012.part)
    add(cylinder008_2.part)
    add(cube015.part)

    # Cut001: cut Fusion002
    add(fusion002.part, mode=Mode.SUBTRACT)

    # Cut003: cut Fusion005
    add(fusion005_1.part, mode=Mode.SUBTRACT)


solid = cut003.part
